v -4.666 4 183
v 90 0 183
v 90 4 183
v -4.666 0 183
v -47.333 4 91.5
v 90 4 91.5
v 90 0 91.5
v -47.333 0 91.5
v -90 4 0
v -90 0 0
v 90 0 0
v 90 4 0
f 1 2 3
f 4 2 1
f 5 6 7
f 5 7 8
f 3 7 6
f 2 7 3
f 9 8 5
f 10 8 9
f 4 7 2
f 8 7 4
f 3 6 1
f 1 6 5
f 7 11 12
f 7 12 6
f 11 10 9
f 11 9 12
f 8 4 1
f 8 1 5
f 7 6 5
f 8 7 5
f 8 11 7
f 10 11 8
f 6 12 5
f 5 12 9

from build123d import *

# Parameters (mm, degrees)
BOSS_EXTRUDE1_DEPTH = 4


with BuildPart() as part:
    # Sketch1 → Boss-Extrude1 (new body)
    with BuildSketch(Plane(origin=(0, 0, 0), x_dir=(1, 0, 0), z_dir=(0, 1, 0))):
        Polygon((-90, 0), (90, 0), (90, -183), (-4.665698558, -183), align=None)
    extrude(amount=BOSS_EXTRUDE1_DEPTH)


with BuildPart() as body_2:
    # Split1: the piece on the far side of the plane
    add(part.part)
    split(bisect_by=Plane(origin=(0, 0, 91.5), x_dir=(-1, 0, 0), z_dir=(0, 0, -1)), keep=Keep.BOTTOM)


with BuildPart() as part_1:
    add(part.part)

    # Split1
    split(bisect_by=Plane(origin=(0, 0, 91.5), x_dir=(-1, 0, 0), z_dir=(0, 0, -1)), keep=Keep.TOP)


solid = Compound([body_2.part, part_1.part])
